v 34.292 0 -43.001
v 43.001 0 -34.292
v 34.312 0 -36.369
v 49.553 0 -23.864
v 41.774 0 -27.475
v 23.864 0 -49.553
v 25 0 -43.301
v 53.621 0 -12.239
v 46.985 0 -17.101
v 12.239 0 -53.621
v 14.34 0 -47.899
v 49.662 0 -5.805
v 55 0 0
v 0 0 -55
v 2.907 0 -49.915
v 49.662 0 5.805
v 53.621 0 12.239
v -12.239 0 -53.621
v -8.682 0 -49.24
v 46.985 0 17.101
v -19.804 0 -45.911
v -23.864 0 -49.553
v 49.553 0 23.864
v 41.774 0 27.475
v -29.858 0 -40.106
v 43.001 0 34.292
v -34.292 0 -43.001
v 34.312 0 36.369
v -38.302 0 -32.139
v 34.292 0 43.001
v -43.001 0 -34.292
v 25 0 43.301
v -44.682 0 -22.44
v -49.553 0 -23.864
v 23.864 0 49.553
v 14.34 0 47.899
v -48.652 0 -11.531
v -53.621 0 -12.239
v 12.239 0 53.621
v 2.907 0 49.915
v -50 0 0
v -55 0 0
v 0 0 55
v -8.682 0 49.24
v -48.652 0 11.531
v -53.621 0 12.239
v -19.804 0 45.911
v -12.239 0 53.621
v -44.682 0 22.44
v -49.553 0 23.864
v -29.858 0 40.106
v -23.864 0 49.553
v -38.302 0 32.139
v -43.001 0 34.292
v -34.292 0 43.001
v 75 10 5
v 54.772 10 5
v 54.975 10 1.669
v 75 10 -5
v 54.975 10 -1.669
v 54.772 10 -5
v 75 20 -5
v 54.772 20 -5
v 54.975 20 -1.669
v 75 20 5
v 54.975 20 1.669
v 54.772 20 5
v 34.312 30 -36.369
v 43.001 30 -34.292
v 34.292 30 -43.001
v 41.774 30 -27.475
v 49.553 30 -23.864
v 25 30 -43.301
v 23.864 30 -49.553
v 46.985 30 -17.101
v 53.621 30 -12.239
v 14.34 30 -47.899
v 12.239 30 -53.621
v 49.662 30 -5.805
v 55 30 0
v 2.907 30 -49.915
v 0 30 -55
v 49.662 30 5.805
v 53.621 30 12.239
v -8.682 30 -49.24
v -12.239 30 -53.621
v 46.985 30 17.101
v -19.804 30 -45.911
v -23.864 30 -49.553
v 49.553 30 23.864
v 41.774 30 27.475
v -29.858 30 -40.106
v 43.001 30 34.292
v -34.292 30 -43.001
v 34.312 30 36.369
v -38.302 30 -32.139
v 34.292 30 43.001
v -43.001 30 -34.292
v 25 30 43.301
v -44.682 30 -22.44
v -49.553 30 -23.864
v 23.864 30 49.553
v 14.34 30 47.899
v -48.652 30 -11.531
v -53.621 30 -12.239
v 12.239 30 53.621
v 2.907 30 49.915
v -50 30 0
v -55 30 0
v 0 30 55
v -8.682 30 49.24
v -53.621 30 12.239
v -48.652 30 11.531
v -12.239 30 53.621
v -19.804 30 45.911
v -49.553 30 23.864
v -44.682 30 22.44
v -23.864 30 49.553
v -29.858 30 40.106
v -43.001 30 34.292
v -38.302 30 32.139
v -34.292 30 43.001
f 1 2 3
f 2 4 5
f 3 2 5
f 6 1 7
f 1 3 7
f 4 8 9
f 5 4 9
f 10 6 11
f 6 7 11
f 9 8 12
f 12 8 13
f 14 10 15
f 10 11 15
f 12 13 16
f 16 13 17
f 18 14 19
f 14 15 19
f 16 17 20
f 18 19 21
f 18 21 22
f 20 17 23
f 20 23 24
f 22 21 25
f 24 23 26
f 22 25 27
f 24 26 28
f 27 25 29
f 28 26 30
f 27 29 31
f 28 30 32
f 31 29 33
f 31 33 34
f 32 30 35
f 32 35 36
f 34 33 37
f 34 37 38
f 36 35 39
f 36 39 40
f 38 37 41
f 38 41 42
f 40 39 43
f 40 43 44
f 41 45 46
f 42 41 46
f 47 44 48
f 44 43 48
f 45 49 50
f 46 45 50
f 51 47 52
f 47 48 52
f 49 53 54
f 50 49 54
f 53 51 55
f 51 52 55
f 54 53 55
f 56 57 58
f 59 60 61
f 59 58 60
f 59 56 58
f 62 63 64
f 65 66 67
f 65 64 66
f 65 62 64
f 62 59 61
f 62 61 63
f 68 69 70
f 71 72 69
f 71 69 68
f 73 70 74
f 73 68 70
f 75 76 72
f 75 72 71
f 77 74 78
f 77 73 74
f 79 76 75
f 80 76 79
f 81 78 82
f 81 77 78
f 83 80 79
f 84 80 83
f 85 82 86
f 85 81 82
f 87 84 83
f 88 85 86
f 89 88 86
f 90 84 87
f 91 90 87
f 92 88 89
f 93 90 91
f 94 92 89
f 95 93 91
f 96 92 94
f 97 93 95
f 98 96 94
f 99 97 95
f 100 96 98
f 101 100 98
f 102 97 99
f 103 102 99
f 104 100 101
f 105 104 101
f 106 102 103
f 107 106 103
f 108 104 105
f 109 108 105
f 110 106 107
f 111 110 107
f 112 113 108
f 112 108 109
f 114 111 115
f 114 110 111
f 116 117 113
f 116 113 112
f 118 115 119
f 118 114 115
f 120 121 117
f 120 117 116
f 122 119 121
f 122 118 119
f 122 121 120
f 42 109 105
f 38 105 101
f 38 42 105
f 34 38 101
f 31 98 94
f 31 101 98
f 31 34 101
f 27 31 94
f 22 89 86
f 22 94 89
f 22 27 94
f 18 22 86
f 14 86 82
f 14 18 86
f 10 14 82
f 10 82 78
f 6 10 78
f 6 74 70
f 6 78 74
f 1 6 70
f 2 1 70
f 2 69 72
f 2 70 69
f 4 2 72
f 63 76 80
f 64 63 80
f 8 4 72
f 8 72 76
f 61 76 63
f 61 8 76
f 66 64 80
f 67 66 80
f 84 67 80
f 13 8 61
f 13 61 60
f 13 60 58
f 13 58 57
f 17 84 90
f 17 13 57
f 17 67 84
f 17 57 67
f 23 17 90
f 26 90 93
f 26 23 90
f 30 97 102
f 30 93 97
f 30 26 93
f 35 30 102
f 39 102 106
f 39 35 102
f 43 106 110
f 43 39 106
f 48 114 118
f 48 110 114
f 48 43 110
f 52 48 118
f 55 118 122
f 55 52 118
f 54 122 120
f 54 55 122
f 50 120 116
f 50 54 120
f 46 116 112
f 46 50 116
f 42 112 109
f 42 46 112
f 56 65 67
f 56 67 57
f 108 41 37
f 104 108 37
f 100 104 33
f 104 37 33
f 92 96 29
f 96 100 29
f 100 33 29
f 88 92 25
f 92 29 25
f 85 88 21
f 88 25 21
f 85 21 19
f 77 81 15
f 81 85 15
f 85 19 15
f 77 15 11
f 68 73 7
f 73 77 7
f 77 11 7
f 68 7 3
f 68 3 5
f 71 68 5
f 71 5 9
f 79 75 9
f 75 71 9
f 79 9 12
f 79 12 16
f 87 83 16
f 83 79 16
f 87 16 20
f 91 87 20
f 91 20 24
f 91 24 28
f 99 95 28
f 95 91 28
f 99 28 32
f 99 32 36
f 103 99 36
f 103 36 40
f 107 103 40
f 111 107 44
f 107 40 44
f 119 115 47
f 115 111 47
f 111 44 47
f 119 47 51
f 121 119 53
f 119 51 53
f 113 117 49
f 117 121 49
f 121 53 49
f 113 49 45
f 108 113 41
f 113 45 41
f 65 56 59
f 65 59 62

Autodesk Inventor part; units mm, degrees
ref_plane "XZ Plane" through (0, 0, 0) normal (0, 1, 0) x (-1, 0, 0)
sketch "Sketch1" plane through (0, 0, 0) normal (0, 1, 0) x (-1, 0, 0)
  circle A0 centre (0, 0) radius 55
  circle A1 centre (0, 0) radius 50
  dimension "d0" = 110
  dimension "d1" = 100
extrude "Extrusion1" add sketch "Sketch1" along normal blind 30
ref_plane "Work Plane1" through (55, 0, 0) normal (1, 0, 0) x (0, 1, 0)
sketch "Sketch2" plane through (55, 0, 0) normal (1, 0, 0) x (0, 1, 0)
  line L0 (20, 5) -> (10, 5)
  line L1 (10, 5) -> (10, -5)
  line L2 (10, -5) -> (20, -5)
  line L3 (20, -5) -> (20, 5)
  line L4 (30, -55) -> (30, 55) projected
  line L5 (-6, 0) -> (36, 0) projected
  point P0 (0, 0)
  dimension "d5" = 10
  dimension "d6" = 10
  dimension "d7" = 10
  dimension "d8" = 5
extrude "Extrusion2" add sketch "Sketch2" along normal blind 20
extrude "Extrusion3" add sketch "Sketch2" against normal blind 5
properties part number "rim"
